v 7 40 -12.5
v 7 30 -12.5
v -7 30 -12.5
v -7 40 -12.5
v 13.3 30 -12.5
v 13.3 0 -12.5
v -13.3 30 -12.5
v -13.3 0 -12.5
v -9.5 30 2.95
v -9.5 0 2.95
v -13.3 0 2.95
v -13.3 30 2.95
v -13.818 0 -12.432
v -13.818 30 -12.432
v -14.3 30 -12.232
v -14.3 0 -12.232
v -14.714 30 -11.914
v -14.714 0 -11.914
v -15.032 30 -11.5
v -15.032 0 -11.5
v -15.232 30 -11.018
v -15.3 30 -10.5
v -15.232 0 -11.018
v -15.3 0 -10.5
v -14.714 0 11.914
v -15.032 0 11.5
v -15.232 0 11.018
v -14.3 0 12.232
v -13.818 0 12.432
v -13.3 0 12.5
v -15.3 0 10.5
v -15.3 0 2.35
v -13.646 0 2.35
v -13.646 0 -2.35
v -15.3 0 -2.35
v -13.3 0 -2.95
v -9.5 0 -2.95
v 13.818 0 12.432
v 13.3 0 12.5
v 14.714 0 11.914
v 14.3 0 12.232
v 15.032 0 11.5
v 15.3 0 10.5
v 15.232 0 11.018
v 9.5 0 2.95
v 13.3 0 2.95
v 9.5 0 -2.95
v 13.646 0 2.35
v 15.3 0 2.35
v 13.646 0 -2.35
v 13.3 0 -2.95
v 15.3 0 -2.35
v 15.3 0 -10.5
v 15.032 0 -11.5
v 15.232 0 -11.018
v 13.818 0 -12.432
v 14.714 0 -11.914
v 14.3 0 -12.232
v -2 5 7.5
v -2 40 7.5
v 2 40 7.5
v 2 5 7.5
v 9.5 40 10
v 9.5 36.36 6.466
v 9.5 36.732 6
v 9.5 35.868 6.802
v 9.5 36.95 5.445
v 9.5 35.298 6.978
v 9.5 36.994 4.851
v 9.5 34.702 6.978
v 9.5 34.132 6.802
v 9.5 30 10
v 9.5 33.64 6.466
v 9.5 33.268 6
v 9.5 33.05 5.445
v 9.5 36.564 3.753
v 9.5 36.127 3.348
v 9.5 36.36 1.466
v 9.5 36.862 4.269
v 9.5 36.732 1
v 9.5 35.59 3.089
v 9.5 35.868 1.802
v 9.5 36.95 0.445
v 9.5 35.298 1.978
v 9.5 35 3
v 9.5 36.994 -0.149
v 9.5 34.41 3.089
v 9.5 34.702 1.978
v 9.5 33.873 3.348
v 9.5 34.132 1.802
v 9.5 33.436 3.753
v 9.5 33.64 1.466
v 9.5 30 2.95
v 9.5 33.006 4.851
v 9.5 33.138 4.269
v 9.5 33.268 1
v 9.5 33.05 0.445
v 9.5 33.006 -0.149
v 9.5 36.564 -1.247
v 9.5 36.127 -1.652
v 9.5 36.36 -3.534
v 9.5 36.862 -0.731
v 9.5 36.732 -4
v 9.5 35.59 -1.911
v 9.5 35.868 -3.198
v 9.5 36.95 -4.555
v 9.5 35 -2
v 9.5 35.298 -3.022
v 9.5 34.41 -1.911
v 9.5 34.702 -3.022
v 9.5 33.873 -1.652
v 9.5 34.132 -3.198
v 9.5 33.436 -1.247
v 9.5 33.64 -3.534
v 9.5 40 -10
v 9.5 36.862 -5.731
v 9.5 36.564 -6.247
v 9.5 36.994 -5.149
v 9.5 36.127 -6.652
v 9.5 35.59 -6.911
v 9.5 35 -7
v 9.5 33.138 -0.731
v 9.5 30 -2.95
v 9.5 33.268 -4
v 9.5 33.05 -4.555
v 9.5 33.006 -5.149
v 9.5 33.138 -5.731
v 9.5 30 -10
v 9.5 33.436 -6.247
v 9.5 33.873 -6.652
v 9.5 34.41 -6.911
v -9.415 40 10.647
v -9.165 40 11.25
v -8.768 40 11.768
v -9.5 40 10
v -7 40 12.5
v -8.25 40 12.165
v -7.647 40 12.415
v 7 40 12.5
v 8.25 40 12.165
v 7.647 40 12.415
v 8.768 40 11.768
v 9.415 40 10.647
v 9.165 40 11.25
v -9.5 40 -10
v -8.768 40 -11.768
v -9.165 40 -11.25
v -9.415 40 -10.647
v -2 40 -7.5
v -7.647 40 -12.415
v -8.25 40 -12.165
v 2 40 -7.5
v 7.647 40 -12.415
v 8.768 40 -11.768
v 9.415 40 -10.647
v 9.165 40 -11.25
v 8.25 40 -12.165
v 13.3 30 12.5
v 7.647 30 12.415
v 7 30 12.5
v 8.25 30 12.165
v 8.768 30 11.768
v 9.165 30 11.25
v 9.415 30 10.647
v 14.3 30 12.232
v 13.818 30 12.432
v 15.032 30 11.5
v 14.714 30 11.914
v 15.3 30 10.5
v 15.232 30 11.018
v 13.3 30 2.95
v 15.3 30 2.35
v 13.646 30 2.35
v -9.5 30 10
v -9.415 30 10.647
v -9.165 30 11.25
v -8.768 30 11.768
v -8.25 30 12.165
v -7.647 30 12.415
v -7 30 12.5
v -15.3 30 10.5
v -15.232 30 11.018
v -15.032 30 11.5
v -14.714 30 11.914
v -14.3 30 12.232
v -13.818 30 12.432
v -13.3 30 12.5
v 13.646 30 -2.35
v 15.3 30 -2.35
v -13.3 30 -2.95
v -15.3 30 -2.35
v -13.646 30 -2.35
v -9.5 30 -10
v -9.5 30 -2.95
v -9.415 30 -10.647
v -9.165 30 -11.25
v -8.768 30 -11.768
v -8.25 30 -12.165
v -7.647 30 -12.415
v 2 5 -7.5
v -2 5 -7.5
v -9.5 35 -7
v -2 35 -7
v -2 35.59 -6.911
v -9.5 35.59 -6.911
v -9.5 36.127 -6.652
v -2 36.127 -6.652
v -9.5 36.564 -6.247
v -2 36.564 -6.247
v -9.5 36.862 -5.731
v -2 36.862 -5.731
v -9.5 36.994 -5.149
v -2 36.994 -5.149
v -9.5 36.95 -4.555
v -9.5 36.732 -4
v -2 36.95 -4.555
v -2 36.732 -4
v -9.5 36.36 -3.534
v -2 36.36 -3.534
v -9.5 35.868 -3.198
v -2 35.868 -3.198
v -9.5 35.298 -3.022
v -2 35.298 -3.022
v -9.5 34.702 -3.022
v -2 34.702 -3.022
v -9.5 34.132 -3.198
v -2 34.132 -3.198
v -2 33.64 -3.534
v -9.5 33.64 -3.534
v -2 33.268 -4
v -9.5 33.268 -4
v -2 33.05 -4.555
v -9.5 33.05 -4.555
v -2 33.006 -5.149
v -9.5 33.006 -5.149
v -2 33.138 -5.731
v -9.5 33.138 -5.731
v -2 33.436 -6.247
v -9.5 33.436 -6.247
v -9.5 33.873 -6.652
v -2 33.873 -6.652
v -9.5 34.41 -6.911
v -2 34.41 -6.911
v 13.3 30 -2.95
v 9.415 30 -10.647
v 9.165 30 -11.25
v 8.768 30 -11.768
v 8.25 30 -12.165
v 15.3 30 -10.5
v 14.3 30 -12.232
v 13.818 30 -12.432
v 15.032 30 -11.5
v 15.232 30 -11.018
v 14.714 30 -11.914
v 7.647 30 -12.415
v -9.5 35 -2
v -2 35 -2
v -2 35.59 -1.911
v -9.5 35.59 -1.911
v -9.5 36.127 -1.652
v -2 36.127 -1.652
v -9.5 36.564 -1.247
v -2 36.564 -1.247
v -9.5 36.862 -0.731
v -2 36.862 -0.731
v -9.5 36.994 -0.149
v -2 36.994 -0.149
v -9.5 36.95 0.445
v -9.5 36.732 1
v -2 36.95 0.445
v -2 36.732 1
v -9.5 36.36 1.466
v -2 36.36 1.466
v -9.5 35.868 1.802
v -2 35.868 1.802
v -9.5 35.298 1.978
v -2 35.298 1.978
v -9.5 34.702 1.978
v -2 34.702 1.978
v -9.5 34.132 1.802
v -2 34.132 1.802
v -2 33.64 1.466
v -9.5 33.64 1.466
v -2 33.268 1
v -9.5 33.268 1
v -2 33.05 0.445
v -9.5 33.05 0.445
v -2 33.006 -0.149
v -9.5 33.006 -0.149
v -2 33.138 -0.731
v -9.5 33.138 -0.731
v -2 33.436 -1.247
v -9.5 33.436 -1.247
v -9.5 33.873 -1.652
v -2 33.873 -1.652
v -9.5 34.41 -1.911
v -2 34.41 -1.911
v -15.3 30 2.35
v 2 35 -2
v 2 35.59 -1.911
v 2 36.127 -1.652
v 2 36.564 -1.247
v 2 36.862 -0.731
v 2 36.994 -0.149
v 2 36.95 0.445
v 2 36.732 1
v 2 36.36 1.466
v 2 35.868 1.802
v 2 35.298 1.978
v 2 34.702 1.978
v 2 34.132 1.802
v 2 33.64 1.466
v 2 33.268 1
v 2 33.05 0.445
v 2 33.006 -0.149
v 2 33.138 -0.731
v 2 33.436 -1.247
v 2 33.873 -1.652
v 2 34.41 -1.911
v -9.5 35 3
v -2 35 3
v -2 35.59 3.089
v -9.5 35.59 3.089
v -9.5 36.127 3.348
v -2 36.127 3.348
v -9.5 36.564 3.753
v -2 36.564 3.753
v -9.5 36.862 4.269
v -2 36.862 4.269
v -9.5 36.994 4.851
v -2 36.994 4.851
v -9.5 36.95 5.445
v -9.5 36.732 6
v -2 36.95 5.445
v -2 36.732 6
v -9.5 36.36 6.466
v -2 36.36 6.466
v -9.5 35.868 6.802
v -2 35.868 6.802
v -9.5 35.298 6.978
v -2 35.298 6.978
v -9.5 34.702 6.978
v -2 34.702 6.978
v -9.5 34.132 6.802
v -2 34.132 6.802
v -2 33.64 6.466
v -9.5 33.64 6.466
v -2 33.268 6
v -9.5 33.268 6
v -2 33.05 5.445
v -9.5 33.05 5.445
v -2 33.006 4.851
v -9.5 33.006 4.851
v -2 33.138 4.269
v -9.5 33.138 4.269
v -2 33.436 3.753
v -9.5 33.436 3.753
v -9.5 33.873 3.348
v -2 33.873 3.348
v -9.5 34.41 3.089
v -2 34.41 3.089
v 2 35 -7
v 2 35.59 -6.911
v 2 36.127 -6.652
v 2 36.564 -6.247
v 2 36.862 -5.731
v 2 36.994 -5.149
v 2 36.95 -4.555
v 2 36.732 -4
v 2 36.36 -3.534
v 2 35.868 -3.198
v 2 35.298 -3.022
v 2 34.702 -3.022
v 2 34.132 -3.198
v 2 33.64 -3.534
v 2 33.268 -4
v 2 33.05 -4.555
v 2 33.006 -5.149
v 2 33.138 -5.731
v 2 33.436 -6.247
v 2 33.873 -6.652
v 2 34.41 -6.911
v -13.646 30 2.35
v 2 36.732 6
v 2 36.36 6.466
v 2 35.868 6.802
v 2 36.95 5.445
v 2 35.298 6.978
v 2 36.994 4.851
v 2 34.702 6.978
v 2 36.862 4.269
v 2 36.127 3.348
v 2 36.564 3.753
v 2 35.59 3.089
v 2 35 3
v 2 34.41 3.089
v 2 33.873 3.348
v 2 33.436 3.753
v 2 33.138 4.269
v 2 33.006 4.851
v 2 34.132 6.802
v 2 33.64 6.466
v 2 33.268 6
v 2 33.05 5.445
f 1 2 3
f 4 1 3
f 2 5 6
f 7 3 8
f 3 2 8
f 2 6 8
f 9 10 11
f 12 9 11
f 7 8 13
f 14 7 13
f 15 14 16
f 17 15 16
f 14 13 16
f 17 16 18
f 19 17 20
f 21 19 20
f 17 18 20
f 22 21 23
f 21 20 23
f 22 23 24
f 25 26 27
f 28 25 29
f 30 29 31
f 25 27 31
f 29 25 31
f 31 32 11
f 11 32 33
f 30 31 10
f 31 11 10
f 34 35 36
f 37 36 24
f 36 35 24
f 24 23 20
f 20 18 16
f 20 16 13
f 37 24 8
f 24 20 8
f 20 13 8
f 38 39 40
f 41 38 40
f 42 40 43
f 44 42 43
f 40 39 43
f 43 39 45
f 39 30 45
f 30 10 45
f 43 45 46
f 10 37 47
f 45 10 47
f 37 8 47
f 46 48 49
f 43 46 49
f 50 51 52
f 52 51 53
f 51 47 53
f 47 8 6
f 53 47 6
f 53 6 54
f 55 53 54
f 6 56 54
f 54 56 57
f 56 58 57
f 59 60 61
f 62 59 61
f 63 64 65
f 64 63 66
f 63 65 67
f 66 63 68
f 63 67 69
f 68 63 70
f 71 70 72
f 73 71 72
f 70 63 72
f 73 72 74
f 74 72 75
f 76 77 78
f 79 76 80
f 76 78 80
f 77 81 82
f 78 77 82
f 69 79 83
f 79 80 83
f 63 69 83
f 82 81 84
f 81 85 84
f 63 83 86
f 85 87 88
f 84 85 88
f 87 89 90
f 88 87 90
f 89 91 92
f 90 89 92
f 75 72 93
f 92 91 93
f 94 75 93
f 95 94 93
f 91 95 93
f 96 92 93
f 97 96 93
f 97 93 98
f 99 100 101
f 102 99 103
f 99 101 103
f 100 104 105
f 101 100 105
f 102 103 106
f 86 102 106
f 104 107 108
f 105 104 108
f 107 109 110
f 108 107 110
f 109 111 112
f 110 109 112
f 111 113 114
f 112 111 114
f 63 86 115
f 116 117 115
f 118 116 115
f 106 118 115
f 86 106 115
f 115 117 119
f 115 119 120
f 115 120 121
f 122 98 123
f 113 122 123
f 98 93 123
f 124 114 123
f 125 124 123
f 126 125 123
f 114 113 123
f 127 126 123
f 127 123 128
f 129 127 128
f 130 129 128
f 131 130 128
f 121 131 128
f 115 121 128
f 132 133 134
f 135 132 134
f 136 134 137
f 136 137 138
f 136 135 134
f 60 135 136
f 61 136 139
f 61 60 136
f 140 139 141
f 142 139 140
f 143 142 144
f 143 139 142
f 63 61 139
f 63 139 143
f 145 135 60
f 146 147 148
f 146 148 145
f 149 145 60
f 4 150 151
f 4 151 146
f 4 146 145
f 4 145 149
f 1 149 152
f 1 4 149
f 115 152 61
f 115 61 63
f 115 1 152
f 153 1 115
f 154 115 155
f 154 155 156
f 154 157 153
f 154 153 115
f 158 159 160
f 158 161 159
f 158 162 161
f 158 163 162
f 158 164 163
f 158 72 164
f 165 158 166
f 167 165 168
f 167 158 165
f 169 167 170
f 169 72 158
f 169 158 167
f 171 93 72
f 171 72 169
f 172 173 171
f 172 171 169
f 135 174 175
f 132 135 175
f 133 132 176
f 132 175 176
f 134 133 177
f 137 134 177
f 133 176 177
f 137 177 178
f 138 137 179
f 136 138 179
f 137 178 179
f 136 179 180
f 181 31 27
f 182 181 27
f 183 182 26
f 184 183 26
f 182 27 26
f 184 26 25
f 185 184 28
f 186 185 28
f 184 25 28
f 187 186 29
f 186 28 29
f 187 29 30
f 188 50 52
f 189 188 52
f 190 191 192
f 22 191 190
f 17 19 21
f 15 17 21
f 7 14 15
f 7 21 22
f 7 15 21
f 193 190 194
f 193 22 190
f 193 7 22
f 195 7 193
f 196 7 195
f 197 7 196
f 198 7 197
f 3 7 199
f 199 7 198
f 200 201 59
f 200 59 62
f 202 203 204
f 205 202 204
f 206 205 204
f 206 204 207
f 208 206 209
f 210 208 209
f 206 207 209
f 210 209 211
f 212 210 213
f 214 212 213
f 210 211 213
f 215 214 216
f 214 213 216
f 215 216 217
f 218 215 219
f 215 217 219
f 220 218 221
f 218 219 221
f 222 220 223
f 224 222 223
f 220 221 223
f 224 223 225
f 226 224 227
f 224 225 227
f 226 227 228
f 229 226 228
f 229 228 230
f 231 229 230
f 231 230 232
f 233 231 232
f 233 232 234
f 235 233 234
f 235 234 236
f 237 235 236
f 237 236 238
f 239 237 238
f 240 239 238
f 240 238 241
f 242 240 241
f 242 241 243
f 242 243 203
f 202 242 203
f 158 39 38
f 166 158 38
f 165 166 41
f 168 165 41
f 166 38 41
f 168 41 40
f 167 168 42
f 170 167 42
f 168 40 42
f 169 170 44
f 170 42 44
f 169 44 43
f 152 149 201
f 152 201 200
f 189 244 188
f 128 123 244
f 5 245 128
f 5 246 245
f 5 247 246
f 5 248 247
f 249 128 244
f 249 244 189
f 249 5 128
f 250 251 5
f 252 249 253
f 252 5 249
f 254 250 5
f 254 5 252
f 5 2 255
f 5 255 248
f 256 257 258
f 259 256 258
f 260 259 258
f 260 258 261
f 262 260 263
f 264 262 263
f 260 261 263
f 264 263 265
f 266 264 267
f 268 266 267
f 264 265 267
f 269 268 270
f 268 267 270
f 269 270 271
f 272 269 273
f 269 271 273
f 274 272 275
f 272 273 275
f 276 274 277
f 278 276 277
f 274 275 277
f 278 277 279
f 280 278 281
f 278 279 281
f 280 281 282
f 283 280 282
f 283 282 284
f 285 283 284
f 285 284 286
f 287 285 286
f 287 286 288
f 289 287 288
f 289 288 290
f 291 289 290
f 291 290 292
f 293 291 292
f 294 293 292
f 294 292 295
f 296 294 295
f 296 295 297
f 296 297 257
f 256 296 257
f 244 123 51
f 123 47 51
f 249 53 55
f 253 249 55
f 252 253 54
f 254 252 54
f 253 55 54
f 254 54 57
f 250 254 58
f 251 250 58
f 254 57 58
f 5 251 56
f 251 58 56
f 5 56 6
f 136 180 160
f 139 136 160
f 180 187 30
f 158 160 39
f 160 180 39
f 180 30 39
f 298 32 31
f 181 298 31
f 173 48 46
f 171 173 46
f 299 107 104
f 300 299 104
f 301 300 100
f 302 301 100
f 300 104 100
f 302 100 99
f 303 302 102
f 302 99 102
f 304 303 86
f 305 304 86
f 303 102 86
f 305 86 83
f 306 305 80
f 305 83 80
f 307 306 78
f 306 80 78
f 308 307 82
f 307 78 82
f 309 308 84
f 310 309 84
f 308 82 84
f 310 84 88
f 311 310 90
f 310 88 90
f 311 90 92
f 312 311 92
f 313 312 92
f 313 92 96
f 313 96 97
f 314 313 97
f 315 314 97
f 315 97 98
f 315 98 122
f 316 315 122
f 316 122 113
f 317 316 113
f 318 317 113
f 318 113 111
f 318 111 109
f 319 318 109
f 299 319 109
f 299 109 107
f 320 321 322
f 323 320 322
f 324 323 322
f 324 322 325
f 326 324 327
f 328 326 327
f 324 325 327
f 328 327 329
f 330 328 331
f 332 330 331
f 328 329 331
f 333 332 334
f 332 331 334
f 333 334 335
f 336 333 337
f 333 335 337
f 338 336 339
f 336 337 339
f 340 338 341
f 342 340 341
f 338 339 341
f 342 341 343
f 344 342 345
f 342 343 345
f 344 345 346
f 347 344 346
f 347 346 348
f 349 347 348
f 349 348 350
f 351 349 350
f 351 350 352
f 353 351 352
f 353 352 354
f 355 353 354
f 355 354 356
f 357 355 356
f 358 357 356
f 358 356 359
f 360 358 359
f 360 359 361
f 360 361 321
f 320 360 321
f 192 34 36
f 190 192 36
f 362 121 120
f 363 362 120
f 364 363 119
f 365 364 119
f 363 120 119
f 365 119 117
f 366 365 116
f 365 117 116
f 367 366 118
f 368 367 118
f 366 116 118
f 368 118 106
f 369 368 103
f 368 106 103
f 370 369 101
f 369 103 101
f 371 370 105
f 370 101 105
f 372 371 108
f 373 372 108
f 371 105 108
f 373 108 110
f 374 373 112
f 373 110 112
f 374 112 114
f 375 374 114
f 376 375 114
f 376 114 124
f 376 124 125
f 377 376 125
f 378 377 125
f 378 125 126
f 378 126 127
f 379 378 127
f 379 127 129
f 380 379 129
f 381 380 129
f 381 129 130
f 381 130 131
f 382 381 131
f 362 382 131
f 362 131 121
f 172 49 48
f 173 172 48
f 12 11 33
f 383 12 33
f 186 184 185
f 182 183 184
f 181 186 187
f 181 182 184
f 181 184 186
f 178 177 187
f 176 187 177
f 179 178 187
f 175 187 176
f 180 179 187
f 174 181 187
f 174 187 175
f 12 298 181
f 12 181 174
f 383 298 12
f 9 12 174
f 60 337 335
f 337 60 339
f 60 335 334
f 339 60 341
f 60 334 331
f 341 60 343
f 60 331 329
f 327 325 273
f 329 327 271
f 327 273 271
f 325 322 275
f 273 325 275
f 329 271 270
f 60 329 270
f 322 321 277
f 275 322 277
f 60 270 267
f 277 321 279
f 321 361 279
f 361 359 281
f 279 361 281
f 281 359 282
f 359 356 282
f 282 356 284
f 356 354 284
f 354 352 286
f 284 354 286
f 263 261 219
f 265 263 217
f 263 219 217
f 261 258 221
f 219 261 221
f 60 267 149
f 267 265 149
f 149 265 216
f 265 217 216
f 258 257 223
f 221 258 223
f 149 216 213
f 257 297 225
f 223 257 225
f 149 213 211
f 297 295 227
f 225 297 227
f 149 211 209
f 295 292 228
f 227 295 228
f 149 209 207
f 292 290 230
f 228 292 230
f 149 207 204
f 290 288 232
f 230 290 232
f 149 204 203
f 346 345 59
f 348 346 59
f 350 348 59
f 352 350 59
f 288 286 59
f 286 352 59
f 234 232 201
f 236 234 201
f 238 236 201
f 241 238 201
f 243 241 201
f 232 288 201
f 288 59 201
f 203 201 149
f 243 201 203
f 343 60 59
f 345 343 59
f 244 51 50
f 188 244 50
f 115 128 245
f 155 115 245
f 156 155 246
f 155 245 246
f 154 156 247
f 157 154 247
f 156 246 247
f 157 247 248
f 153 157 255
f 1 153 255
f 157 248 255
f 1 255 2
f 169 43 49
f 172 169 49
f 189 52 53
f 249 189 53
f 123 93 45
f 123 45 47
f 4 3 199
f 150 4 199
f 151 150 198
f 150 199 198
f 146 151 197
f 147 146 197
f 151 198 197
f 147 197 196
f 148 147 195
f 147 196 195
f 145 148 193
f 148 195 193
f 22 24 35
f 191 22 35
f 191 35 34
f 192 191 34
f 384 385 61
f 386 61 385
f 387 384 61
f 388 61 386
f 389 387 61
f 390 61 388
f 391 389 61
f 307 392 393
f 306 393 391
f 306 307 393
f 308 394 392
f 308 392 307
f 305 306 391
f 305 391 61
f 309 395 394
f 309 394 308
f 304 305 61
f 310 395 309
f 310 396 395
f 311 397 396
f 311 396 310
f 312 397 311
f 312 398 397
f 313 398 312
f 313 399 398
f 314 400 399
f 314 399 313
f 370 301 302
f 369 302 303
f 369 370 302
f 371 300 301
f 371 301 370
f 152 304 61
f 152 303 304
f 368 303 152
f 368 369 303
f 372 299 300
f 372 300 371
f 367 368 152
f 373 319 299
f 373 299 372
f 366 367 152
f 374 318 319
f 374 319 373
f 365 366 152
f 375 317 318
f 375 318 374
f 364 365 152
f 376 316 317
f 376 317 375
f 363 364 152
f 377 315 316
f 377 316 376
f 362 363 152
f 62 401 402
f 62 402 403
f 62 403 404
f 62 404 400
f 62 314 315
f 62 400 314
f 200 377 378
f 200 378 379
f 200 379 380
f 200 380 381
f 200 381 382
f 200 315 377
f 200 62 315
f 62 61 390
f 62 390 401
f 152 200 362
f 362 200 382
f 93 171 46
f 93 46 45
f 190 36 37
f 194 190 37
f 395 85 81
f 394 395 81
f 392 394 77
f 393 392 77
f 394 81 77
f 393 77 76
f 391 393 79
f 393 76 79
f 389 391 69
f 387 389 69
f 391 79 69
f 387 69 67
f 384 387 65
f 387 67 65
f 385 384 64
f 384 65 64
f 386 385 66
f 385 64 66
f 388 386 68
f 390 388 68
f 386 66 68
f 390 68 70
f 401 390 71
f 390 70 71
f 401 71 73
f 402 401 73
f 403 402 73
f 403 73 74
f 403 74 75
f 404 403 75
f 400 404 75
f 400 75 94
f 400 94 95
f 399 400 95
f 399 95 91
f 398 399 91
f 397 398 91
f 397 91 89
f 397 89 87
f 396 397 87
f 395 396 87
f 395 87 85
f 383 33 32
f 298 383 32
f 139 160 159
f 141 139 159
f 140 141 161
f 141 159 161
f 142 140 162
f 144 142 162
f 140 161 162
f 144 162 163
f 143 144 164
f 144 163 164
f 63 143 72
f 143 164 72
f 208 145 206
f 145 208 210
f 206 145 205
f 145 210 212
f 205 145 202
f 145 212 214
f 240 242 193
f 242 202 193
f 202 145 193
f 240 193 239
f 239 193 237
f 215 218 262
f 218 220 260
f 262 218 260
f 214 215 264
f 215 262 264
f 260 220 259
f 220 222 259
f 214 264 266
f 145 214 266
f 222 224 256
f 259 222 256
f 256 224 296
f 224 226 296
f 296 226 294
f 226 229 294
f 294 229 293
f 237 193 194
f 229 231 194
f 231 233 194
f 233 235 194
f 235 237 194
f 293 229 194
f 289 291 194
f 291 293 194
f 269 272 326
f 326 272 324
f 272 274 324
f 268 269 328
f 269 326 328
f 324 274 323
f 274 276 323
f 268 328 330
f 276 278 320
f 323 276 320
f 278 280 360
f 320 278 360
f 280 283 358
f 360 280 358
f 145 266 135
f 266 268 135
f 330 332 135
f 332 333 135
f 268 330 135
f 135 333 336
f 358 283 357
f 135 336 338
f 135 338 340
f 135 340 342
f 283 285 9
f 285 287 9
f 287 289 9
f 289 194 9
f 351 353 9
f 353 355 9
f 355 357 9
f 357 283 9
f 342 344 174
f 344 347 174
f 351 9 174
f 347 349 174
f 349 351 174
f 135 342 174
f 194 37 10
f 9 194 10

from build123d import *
from OCP.BRepAlgoAPI import BRepAlgoAPI_Cut
from OCP.TopTools import TopTools_ListOfShape

# Parameters (mm, degrees)
BOSS_EXTRUDE1_DEPTH = 30
SKETCH3_W           = 4
SKETCH3_H           = 15
BOSS_EXTRUDE2_DEPTH = 10
SKETCH4_W           = 4
SKETCH4_H           = 15
CUT_EXTRUDE1_DEPTH  = 35
SKETCH5_R           = 2
CUT_EXTRUDE2_DEPTH  = 35


with BuildPart() as part:
    # Sketch2 → Boss-Extrude1 (new body)
    with BuildSketch(Plane(origin=(0, 0, 0), x_dir=(1, 0, 0), z_dir=(0, 1, 0))):
        with BuildLine():
            ThreePointArc((-13.300000086, 12.500000186), (-14.714213649, 11.914213749), (-15.300000086, 10.500000186))
            Line((-15.300000086, 10.500000186), (-15.300000086, 2.350000088))
            Line((-15.300000086, 2.350000088), (-13.646409847, 2.350000088))
            Line((-13.646409847, 2.350000088), (-13.299999759, 2.95))
            Line((-13.299999759, 2.95), (-9.499999695, 2.95))
            Line((-9.499999695, 2.95), (-9.499999695, -2.95))
            Line((-9.499999695, -2.95), (-13.299999759, -2.95))
            Line((-13.299999759, -2.95), (-13.646409847, -2.350000088))
            Line((-13.646409847, -2.350000088), (-15.300000086, -2.350000088))
            Line((-15.300000086, -2.350000088), (-15.300000086, -10.500000186))
            ThreePointArc((-15.300000086, -10.500000186), (-14.714213649, -11.914213749), (-13.300000086, -12.500000186))
            Line((-13.300000086, -12.500000186), (13.300000086, -12.500000186))
            ThreePointArc((13.300000086, -12.500000186), (14.714213649, -11.914213749), (15.300000086, -10.500000186))
            Line((15.300000086, -10.500000186), (15.300000086, -2.350000088))
            Line((15.300000086, -2.350000088), (13.646408916, -2.350000088))
            Line((13.646408916, -2.350000088), (13.299999759, -2.95))
            Line((13.299999759, -2.95), (9.499998763, -2.95))
            Line((9.499998763, -2.95), (9.499998763, 2.95))
            Line((9.499998763, 2.95), (13.299999759, 2.95))
            Line((13.299999759, 2.95), (13.646408916, 2.350000088))
            Line((13.646408916, 2.350000088), (15.300000086, 2.350000088))
            Line((15.300000086, 2.350000088), (15.300000086, 10.500000186))
            ThreePointArc((15.300000086, 10.500000186), (14.714213649, 11.914213749), (13.300000086, 12.500000186))
            Line((13.300000086, 12.500000186), (-13.300000086, 12.500000186))
        make_face()
    extrude(amount=BOSS_EXTRUDE1_DEPTH)

    # Sketch3 → Boss-Extrude2 (add)
    with BuildSketch(Plane(origin=(0, 30, 0), x_dir=(1, 0, 0), z_dir=(0, 1, 0))):
        with BuildLine():
            ThreePointArc((-9.499999695, -10.000000186), (-8.767766647, -11.767767139), (-6.999999695, -12.500000186))
            Line((-6.999999695, -12.500000186), (6.999999695, -12.500000186))
            ThreePointArc((6.999999695, -12.500000186), (8.767766647, -11.767767139), (9.499999695, -10.000000186))
            Line((9.499999695, -10.000000186), (9.499999695, 10.000000186))
            ThreePointArc((9.499999695, 10.000000186), (8.767766647, 11.767767139), (6.999999695, 12.500000186))
            Line((6.999999695, 12.500000186), (-6.999999695, 12.500000186))
            ThreePointArc((-6.999999695, 12.500000186), (-8.767766647, 11.767767139), (-9.499999695, 10.000000186))
            Line((-9.499999695, 10.000000186), (-9.499999695, -10.000000186))
        make_face()
        Rectangle(SKETCH3_W, SKETCH3_H, mode=Mode.SUBTRACT)
    extrude(amount=BOSS_EXTRUDE2_DEPTH)

    # Sketch4 → Cut-Extrude1 (cut)
    with BuildSketch(Plane(origin=(0, 40, 0), x_dir=(1, 0, 0), z_dir=(0, 1, 0))):
        Rectangle(SKETCH4_W, SKETCH4_H)
    extrude(amount=-CUT_EXTRUDE1_DEPTH, mode=Mode.SUBTRACT)


with BuildPart() as cut_extrude2_tool:
    # Sketch5 → Cut-Extrude2 (new body)
    with BuildSketch(Plane(origin=(9.499998763, 0, 0), x_dir=(0, 0, -1), z_dir=(1, 0, 0))):
        with Locations((0, 35)):
            Circle(SKETCH5_R)
        with Locations((5, 35)):
            Circle(SKETCH5_R)
        with Locations((-5, 35)):
            Circle(SKETCH5_R)
    extrude(amount=-CUT_EXTRUDE2_DEPTH)


with BuildPart() as part_1:
    add(part.part)

    # Cut-Extrude2: cut by cut_extrude2_tool, with a tolerance
    cut_extrude2_stock = TopTools_ListOfShape()
    cut_extrude2_stock.Append(part_1.part.wrapped)
    cut_extrude2_tools = TopTools_ListOfShape()
    cut_extrude2_tools.Append(cut_extrude2_tool.part.wrapped)
    cut_extrude2_cut = BRepAlgoAPI_Cut()
    cut_extrude2_cut.SetArguments(cut_extrude2_stock)
    cut_extrude2_cut.SetTools(cut_extrude2_tools)
    cut_extrude2_cut.SetFuzzyValue(0.00001)
    cut_extrude2_cut.Build()
    add(Compound.cast(cut_extrude2_cut.Shape()).solids(), mode=Mode.REPLACE)


solid = part_1.part
